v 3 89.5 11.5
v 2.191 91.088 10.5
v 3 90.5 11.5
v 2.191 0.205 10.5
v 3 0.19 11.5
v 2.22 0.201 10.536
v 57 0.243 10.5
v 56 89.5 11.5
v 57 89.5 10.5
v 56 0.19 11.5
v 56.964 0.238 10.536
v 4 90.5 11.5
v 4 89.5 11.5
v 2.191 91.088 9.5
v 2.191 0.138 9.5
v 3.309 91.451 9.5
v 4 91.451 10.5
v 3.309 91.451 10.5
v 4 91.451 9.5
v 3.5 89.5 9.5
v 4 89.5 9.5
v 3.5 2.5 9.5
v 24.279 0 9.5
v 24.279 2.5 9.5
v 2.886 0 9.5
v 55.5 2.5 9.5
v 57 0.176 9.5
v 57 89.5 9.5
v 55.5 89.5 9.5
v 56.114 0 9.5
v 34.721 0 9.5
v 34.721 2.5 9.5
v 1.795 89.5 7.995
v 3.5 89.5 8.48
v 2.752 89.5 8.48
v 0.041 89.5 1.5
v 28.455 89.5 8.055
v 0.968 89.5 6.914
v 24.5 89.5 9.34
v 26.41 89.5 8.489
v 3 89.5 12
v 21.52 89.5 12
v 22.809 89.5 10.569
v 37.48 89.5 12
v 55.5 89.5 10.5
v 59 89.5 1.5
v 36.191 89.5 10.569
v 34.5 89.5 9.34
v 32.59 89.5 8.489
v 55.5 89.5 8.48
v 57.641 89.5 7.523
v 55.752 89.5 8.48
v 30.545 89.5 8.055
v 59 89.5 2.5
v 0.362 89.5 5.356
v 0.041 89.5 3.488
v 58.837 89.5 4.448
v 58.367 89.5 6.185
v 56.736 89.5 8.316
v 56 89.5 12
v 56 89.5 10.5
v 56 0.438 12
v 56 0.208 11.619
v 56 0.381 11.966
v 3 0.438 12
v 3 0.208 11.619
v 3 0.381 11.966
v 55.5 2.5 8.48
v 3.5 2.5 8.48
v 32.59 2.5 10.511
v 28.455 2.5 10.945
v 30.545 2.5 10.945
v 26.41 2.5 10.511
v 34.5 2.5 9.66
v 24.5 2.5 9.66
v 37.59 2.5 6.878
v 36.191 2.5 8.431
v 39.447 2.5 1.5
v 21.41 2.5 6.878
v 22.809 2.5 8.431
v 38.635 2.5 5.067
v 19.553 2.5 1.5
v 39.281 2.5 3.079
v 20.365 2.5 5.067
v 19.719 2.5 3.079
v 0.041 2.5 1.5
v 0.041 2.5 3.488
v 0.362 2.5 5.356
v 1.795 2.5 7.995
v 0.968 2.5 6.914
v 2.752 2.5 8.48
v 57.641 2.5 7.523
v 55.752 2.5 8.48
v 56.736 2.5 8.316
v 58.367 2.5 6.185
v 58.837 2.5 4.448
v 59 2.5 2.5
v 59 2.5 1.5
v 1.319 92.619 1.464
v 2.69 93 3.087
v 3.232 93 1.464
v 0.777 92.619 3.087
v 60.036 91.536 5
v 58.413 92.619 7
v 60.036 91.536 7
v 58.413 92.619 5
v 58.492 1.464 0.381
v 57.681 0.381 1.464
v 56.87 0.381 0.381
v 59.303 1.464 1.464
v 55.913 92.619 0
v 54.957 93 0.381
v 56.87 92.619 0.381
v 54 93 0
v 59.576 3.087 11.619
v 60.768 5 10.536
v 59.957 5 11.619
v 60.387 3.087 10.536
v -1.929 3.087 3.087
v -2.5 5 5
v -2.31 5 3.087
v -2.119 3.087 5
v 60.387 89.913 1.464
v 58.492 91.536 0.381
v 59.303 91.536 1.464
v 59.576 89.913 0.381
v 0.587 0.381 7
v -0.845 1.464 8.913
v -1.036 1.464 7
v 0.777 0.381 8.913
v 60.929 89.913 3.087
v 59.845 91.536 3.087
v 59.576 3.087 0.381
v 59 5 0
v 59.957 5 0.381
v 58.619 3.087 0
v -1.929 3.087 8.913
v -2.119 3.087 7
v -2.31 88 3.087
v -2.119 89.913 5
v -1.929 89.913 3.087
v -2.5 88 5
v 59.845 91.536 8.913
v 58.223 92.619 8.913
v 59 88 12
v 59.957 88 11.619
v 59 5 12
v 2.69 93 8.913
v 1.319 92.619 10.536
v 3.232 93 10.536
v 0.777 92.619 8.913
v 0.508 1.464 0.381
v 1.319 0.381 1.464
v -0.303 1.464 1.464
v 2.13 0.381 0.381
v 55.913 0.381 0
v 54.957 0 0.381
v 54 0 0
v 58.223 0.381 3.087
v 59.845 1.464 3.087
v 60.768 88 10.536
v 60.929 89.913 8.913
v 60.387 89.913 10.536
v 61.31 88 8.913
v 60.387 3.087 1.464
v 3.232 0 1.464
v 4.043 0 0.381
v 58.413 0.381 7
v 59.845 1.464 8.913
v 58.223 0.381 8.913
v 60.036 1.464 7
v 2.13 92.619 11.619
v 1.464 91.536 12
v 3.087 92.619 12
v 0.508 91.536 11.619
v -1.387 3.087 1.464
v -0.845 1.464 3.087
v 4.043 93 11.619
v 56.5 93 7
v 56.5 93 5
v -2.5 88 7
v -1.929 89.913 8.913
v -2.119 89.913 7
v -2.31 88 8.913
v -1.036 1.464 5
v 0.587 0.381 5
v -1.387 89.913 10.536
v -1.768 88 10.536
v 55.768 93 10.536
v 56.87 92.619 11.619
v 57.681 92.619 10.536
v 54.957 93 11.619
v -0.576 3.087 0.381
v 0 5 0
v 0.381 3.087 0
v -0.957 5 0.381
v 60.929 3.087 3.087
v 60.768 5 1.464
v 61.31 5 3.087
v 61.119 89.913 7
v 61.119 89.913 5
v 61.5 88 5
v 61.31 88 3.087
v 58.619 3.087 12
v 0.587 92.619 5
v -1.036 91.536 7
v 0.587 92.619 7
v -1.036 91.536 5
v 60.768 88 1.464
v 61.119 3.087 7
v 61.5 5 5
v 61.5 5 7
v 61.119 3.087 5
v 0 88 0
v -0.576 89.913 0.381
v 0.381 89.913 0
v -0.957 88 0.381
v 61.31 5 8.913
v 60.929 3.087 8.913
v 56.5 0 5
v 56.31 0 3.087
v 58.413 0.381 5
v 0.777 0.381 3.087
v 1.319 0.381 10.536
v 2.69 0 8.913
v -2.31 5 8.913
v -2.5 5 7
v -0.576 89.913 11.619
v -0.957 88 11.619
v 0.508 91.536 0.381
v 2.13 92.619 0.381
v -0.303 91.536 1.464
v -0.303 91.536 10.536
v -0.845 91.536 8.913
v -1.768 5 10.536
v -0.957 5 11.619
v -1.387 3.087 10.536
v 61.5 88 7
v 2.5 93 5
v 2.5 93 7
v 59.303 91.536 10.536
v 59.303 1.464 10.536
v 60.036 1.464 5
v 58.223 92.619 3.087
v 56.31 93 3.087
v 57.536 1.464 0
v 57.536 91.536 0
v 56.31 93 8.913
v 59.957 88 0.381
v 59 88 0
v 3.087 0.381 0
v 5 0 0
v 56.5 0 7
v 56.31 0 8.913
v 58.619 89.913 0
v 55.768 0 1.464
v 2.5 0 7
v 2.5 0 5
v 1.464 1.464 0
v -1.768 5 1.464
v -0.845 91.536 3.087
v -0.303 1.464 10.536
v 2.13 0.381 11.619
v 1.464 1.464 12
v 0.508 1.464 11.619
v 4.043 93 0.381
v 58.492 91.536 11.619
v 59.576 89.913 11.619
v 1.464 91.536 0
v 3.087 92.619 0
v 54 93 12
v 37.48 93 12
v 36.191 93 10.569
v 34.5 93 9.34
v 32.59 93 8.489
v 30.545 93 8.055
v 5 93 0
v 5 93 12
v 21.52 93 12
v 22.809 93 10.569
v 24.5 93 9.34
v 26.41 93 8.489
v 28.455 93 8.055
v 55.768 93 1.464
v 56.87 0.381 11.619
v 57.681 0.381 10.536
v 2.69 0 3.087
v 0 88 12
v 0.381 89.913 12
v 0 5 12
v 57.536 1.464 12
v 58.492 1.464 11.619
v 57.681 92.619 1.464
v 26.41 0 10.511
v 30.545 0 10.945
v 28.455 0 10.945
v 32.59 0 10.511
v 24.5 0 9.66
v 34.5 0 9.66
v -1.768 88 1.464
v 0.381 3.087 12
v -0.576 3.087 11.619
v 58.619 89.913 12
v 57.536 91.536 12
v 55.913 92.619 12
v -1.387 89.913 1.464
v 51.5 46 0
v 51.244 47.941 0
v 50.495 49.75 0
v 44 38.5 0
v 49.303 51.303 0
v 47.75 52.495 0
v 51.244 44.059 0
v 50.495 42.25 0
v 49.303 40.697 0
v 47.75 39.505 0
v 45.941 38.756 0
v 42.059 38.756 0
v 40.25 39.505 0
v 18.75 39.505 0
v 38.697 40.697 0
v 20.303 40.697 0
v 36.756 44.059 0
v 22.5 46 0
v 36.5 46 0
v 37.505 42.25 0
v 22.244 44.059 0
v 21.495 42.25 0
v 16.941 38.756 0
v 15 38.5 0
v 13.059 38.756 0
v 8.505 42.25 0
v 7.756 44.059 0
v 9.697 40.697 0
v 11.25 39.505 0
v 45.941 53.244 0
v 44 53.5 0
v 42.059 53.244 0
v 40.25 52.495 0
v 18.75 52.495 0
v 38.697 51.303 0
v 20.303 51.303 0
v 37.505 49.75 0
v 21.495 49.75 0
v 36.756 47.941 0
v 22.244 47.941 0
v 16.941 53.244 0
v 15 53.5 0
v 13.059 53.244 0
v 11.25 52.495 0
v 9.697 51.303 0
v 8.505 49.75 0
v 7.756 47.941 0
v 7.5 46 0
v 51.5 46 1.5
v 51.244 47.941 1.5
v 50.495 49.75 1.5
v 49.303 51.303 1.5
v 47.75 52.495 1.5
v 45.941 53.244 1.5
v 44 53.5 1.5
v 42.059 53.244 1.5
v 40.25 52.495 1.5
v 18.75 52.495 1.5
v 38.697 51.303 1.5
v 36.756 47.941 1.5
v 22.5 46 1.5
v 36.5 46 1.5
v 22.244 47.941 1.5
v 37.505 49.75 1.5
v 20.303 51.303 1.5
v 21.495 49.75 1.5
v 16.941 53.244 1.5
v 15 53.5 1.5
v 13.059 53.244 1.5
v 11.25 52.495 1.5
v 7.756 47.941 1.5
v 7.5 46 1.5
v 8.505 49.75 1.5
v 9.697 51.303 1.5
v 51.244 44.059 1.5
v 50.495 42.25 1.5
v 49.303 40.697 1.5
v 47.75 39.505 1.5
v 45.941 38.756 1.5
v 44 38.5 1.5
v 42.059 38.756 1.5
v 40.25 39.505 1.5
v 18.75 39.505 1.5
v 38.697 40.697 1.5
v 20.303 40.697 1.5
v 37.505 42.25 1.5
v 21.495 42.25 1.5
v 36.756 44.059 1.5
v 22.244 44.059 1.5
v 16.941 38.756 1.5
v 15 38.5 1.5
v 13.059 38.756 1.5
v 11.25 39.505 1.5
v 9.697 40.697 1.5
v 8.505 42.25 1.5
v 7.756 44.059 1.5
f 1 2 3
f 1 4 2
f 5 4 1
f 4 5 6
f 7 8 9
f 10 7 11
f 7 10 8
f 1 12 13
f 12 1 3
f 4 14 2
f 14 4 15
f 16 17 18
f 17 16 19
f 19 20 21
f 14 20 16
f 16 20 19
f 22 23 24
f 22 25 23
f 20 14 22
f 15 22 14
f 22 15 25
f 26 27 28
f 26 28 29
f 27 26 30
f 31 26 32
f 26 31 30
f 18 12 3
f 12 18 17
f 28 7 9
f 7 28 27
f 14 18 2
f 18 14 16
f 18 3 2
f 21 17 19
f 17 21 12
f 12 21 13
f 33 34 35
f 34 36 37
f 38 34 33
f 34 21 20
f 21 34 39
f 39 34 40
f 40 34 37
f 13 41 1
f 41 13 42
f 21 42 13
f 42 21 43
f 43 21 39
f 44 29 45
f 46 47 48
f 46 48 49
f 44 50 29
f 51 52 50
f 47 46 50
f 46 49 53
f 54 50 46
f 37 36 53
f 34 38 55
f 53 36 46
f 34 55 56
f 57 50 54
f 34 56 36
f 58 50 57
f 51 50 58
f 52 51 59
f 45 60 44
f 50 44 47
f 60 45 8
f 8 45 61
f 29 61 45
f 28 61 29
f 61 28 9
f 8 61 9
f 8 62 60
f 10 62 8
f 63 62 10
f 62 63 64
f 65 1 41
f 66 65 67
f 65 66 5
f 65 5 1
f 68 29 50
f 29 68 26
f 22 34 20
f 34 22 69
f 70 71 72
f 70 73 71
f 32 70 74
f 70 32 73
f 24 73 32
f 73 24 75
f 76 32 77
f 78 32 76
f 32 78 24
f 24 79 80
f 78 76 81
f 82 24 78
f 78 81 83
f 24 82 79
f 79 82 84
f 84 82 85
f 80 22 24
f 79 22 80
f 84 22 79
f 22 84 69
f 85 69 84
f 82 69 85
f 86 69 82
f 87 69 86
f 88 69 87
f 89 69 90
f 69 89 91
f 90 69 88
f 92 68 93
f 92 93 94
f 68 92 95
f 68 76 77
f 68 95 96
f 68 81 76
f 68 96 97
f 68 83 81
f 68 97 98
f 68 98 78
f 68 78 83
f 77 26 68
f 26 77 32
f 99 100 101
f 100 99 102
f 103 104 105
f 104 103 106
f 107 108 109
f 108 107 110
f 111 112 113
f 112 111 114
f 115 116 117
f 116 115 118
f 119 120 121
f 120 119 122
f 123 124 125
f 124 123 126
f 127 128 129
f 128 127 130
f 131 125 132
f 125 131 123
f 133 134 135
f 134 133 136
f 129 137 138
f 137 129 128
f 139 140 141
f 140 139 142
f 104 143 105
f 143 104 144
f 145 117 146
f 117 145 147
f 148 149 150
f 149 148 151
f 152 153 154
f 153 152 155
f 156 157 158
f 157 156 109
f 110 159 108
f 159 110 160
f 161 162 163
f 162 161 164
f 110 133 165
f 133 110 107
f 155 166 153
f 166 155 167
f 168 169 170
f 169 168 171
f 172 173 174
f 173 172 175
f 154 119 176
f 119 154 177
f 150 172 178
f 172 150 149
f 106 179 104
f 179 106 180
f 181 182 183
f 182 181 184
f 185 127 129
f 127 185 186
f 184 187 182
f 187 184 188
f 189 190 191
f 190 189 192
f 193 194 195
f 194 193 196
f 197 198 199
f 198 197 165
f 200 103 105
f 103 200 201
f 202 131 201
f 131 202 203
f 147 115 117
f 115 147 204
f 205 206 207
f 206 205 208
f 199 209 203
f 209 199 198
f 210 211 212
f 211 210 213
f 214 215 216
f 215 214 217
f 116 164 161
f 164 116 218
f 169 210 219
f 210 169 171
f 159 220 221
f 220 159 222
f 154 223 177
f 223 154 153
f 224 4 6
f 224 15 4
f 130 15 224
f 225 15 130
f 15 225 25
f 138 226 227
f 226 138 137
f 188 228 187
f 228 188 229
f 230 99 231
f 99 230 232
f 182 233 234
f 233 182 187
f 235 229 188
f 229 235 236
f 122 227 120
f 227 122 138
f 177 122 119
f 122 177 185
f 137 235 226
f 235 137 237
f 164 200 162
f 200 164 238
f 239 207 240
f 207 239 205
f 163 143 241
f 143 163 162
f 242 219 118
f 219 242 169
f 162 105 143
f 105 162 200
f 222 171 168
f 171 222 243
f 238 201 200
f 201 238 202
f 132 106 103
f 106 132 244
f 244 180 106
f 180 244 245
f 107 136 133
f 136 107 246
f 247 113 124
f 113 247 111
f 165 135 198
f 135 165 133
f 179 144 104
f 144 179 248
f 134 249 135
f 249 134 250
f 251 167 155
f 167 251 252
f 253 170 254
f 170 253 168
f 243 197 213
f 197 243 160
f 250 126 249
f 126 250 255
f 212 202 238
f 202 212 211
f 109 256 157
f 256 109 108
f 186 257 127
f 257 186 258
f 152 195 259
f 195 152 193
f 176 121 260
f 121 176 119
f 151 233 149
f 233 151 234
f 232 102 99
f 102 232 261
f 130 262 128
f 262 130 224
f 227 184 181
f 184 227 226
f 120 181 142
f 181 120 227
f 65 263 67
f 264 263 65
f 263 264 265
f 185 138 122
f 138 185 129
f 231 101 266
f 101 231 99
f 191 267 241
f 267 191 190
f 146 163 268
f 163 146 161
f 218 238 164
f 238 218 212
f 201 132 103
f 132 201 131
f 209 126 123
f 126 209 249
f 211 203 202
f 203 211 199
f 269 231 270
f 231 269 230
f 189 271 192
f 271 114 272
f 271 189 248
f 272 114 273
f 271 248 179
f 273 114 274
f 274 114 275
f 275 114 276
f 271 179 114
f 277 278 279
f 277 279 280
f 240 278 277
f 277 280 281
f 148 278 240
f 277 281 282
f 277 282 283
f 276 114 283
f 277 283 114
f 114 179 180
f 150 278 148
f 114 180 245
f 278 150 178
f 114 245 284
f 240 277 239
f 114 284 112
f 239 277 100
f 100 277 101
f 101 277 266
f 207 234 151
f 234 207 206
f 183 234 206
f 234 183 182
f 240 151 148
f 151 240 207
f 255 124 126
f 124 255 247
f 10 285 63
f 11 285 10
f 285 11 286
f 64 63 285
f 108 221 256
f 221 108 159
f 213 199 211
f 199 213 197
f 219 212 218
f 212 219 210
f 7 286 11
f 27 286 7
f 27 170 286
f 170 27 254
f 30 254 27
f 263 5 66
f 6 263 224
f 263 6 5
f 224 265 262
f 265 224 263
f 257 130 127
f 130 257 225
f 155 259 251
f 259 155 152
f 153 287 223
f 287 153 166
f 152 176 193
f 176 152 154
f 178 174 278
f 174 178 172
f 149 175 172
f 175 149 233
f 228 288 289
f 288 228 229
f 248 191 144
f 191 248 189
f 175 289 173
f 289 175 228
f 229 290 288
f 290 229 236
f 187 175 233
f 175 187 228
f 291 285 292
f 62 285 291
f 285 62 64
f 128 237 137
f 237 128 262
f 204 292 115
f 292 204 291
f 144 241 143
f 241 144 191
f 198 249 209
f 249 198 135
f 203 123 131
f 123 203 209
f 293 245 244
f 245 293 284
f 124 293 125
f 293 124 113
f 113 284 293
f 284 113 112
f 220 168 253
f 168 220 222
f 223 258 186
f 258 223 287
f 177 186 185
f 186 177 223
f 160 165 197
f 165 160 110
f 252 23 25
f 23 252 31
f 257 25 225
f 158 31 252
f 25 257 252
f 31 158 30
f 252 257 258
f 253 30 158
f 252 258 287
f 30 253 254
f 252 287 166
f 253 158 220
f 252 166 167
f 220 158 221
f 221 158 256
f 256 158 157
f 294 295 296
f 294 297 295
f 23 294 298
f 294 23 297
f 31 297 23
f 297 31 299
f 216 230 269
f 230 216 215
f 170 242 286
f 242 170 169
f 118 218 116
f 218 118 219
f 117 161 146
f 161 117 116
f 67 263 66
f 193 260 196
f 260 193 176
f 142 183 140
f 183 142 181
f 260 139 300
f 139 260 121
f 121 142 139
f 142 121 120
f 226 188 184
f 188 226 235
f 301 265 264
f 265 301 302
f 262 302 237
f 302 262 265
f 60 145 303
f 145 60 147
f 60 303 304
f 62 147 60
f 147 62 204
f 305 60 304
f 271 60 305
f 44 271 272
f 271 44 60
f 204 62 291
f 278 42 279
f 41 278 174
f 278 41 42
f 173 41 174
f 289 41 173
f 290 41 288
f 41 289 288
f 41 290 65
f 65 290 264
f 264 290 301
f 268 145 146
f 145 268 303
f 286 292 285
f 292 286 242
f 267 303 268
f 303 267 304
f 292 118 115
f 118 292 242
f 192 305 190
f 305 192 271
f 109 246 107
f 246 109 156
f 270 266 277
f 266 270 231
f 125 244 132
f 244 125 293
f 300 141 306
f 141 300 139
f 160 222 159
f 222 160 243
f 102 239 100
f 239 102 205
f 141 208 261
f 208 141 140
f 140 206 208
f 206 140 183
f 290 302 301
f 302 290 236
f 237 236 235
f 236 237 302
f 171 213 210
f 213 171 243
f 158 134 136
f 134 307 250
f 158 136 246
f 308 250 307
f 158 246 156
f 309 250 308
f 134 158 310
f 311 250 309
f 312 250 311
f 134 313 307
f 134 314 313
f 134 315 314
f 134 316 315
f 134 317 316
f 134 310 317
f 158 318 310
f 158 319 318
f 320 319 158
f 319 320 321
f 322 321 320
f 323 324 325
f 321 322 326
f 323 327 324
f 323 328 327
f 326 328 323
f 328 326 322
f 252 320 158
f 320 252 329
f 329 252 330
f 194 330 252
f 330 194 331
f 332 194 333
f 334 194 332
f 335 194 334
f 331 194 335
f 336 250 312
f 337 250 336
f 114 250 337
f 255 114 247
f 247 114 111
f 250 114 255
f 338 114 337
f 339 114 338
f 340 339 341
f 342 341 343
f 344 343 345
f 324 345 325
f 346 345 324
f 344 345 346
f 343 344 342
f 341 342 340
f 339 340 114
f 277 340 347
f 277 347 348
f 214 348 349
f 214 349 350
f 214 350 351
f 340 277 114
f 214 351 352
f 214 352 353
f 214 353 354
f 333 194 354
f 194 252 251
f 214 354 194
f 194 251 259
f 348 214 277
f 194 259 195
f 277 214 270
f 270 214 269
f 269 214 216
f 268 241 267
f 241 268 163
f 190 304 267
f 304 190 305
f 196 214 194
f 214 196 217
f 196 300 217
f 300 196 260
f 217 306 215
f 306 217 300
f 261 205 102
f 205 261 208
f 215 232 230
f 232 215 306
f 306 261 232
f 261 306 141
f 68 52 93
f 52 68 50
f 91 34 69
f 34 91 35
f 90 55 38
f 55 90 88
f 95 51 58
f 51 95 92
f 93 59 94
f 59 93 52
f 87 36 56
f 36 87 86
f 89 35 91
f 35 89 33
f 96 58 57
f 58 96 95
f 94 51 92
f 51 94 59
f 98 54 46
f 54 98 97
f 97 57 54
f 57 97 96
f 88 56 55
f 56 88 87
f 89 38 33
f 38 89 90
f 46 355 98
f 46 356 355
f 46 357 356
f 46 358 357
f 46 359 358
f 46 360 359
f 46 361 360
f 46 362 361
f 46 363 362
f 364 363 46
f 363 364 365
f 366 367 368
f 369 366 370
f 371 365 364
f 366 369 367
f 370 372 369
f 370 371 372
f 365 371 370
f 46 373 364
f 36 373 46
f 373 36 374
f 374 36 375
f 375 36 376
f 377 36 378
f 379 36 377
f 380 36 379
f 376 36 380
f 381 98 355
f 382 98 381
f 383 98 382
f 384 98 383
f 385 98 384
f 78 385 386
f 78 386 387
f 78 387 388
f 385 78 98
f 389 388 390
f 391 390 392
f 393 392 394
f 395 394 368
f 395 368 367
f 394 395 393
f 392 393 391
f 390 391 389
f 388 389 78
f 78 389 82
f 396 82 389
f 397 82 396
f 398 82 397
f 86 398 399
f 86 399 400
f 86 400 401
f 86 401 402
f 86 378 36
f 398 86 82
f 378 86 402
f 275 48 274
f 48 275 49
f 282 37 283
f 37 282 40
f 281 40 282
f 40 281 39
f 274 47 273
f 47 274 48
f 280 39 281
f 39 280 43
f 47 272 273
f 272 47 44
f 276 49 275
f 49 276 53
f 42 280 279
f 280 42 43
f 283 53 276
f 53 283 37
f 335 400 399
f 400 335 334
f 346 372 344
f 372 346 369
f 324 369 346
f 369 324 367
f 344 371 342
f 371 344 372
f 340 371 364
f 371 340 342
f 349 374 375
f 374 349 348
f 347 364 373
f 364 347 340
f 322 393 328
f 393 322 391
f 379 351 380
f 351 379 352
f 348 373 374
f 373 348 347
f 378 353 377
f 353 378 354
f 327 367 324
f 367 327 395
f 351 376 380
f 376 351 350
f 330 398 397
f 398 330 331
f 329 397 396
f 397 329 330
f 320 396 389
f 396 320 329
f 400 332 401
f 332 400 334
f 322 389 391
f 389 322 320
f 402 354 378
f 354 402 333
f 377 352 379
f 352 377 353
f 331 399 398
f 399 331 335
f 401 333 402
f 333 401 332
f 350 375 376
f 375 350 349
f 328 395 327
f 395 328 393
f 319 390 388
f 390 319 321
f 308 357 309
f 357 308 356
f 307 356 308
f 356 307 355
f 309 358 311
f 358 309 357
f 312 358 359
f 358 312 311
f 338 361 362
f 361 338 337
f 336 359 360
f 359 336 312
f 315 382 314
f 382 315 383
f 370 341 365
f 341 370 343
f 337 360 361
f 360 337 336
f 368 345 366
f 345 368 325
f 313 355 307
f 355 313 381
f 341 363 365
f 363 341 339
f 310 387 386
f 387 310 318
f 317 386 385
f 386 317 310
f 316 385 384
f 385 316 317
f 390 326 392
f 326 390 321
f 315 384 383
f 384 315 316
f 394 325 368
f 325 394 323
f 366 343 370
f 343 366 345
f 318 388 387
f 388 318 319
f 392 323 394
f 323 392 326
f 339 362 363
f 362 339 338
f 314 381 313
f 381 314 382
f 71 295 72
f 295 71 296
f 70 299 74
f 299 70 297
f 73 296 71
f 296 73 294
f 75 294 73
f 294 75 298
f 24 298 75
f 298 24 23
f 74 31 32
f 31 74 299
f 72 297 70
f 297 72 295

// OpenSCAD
card_length = 87;
card_width = 55; 
height = 12;

head_thickness = 2.5;
side_thickness = 2;
base_thickness = 1.5;

finger_hole_dia = 15;
top_rounding_dia = 8;
corner_rounding_r = 5;

module base() {
	translate([corner_rounding_r, corner_rounding_r, height/2-1])

	minkowski() {

	// object is now 2 mm high
	minkowski() {
	 	cube([card_width-2*corner_rounding_r+side_thickness*2, card_length-2*corner_rounding_r+head_thickness*2, 1]);	    
		cylinder(r=corner_rounding_r, h=1);
	}

	scale([0.5, 1, 1])
	rotate([-90, 0, 0])
	cylinder(r=(height-2)/2, h=1);

	}
}

module inner_cutout() {

difference() {
	translate([1, 1-(head_thickness+1), height-4])
	minkowski() {
		cube([card_width-2, card_length+head_thickness+1, 1]);
		cylinder(r1=1, r2=0, h=1);
	} 

	// fill one part again, why 2.5?? buggy??
	translate([side_thickness, head_thickness+card_length-2.5, 0])
	cube([card_width, head_thickness, height]);
	}

	translate([1, -(head_thickness+1), height-3])
	cube([card_width-2, card_length+head_thickness+1, 5]);

	translate([1.5, 0, base_thickness])
	cube([card_width-3, card_length, height-base_thickness-3]);

}


module part() {
	difference() {
		base();

		translate([side_thickness, head_thickness, base_thickness])
		inner_cutout();
	}
}

union() {
difference() {

// main part
part();

// half cylinder cup
translate([1+side_thickness, head_thickness, base_thickness])
difference() {
minkowski() {
	cube([card_width-2, card_length-1, 1]);

	scale([3/(height-base_thickness-4.5),1,1])
	rotate([-90, 0, 0])
	cylinder(r=(height-base_thickness-4.5), h=1);
}
translate([-500, -500, -1000])
cube([1000, 1000, 1000]);
}

// Finger thing on top
translate([card_width/2+side_thickness, card_length+2*head_thickness+2, height+6])
rotate([90, 0, 0])
cylinder(r=10, h=10);


// Finger holes on bottom
/*translate([card_width/2+side_thickness, 20, -1])
cylinder(r=finger_hole_dia/2, h=10);

translate([card_width/2+side_thickness, (card_length+2*head_thickness)-20, -1])
cylinder(r=finger_hole_dia/2, h=10); */

translate([15, card_length/2+head_thickness, -1])
cylinder(r=finger_hole_dia/2, h=10);

translate([(card_width+2*side_thickness)-15, card_length/2+head_thickness, -1])
cylinder(r=finger_hole_dia/2, h=10);

}

// card stopper
difference() {

translate([card_width/2+side_thickness, 0, height-11])
rotate([-90,0,0])
cylinder(r=10, h=head_thickness);

translate([-500, -500, -1000])
cube([1000, 1000, 1000]);

}

} // union
